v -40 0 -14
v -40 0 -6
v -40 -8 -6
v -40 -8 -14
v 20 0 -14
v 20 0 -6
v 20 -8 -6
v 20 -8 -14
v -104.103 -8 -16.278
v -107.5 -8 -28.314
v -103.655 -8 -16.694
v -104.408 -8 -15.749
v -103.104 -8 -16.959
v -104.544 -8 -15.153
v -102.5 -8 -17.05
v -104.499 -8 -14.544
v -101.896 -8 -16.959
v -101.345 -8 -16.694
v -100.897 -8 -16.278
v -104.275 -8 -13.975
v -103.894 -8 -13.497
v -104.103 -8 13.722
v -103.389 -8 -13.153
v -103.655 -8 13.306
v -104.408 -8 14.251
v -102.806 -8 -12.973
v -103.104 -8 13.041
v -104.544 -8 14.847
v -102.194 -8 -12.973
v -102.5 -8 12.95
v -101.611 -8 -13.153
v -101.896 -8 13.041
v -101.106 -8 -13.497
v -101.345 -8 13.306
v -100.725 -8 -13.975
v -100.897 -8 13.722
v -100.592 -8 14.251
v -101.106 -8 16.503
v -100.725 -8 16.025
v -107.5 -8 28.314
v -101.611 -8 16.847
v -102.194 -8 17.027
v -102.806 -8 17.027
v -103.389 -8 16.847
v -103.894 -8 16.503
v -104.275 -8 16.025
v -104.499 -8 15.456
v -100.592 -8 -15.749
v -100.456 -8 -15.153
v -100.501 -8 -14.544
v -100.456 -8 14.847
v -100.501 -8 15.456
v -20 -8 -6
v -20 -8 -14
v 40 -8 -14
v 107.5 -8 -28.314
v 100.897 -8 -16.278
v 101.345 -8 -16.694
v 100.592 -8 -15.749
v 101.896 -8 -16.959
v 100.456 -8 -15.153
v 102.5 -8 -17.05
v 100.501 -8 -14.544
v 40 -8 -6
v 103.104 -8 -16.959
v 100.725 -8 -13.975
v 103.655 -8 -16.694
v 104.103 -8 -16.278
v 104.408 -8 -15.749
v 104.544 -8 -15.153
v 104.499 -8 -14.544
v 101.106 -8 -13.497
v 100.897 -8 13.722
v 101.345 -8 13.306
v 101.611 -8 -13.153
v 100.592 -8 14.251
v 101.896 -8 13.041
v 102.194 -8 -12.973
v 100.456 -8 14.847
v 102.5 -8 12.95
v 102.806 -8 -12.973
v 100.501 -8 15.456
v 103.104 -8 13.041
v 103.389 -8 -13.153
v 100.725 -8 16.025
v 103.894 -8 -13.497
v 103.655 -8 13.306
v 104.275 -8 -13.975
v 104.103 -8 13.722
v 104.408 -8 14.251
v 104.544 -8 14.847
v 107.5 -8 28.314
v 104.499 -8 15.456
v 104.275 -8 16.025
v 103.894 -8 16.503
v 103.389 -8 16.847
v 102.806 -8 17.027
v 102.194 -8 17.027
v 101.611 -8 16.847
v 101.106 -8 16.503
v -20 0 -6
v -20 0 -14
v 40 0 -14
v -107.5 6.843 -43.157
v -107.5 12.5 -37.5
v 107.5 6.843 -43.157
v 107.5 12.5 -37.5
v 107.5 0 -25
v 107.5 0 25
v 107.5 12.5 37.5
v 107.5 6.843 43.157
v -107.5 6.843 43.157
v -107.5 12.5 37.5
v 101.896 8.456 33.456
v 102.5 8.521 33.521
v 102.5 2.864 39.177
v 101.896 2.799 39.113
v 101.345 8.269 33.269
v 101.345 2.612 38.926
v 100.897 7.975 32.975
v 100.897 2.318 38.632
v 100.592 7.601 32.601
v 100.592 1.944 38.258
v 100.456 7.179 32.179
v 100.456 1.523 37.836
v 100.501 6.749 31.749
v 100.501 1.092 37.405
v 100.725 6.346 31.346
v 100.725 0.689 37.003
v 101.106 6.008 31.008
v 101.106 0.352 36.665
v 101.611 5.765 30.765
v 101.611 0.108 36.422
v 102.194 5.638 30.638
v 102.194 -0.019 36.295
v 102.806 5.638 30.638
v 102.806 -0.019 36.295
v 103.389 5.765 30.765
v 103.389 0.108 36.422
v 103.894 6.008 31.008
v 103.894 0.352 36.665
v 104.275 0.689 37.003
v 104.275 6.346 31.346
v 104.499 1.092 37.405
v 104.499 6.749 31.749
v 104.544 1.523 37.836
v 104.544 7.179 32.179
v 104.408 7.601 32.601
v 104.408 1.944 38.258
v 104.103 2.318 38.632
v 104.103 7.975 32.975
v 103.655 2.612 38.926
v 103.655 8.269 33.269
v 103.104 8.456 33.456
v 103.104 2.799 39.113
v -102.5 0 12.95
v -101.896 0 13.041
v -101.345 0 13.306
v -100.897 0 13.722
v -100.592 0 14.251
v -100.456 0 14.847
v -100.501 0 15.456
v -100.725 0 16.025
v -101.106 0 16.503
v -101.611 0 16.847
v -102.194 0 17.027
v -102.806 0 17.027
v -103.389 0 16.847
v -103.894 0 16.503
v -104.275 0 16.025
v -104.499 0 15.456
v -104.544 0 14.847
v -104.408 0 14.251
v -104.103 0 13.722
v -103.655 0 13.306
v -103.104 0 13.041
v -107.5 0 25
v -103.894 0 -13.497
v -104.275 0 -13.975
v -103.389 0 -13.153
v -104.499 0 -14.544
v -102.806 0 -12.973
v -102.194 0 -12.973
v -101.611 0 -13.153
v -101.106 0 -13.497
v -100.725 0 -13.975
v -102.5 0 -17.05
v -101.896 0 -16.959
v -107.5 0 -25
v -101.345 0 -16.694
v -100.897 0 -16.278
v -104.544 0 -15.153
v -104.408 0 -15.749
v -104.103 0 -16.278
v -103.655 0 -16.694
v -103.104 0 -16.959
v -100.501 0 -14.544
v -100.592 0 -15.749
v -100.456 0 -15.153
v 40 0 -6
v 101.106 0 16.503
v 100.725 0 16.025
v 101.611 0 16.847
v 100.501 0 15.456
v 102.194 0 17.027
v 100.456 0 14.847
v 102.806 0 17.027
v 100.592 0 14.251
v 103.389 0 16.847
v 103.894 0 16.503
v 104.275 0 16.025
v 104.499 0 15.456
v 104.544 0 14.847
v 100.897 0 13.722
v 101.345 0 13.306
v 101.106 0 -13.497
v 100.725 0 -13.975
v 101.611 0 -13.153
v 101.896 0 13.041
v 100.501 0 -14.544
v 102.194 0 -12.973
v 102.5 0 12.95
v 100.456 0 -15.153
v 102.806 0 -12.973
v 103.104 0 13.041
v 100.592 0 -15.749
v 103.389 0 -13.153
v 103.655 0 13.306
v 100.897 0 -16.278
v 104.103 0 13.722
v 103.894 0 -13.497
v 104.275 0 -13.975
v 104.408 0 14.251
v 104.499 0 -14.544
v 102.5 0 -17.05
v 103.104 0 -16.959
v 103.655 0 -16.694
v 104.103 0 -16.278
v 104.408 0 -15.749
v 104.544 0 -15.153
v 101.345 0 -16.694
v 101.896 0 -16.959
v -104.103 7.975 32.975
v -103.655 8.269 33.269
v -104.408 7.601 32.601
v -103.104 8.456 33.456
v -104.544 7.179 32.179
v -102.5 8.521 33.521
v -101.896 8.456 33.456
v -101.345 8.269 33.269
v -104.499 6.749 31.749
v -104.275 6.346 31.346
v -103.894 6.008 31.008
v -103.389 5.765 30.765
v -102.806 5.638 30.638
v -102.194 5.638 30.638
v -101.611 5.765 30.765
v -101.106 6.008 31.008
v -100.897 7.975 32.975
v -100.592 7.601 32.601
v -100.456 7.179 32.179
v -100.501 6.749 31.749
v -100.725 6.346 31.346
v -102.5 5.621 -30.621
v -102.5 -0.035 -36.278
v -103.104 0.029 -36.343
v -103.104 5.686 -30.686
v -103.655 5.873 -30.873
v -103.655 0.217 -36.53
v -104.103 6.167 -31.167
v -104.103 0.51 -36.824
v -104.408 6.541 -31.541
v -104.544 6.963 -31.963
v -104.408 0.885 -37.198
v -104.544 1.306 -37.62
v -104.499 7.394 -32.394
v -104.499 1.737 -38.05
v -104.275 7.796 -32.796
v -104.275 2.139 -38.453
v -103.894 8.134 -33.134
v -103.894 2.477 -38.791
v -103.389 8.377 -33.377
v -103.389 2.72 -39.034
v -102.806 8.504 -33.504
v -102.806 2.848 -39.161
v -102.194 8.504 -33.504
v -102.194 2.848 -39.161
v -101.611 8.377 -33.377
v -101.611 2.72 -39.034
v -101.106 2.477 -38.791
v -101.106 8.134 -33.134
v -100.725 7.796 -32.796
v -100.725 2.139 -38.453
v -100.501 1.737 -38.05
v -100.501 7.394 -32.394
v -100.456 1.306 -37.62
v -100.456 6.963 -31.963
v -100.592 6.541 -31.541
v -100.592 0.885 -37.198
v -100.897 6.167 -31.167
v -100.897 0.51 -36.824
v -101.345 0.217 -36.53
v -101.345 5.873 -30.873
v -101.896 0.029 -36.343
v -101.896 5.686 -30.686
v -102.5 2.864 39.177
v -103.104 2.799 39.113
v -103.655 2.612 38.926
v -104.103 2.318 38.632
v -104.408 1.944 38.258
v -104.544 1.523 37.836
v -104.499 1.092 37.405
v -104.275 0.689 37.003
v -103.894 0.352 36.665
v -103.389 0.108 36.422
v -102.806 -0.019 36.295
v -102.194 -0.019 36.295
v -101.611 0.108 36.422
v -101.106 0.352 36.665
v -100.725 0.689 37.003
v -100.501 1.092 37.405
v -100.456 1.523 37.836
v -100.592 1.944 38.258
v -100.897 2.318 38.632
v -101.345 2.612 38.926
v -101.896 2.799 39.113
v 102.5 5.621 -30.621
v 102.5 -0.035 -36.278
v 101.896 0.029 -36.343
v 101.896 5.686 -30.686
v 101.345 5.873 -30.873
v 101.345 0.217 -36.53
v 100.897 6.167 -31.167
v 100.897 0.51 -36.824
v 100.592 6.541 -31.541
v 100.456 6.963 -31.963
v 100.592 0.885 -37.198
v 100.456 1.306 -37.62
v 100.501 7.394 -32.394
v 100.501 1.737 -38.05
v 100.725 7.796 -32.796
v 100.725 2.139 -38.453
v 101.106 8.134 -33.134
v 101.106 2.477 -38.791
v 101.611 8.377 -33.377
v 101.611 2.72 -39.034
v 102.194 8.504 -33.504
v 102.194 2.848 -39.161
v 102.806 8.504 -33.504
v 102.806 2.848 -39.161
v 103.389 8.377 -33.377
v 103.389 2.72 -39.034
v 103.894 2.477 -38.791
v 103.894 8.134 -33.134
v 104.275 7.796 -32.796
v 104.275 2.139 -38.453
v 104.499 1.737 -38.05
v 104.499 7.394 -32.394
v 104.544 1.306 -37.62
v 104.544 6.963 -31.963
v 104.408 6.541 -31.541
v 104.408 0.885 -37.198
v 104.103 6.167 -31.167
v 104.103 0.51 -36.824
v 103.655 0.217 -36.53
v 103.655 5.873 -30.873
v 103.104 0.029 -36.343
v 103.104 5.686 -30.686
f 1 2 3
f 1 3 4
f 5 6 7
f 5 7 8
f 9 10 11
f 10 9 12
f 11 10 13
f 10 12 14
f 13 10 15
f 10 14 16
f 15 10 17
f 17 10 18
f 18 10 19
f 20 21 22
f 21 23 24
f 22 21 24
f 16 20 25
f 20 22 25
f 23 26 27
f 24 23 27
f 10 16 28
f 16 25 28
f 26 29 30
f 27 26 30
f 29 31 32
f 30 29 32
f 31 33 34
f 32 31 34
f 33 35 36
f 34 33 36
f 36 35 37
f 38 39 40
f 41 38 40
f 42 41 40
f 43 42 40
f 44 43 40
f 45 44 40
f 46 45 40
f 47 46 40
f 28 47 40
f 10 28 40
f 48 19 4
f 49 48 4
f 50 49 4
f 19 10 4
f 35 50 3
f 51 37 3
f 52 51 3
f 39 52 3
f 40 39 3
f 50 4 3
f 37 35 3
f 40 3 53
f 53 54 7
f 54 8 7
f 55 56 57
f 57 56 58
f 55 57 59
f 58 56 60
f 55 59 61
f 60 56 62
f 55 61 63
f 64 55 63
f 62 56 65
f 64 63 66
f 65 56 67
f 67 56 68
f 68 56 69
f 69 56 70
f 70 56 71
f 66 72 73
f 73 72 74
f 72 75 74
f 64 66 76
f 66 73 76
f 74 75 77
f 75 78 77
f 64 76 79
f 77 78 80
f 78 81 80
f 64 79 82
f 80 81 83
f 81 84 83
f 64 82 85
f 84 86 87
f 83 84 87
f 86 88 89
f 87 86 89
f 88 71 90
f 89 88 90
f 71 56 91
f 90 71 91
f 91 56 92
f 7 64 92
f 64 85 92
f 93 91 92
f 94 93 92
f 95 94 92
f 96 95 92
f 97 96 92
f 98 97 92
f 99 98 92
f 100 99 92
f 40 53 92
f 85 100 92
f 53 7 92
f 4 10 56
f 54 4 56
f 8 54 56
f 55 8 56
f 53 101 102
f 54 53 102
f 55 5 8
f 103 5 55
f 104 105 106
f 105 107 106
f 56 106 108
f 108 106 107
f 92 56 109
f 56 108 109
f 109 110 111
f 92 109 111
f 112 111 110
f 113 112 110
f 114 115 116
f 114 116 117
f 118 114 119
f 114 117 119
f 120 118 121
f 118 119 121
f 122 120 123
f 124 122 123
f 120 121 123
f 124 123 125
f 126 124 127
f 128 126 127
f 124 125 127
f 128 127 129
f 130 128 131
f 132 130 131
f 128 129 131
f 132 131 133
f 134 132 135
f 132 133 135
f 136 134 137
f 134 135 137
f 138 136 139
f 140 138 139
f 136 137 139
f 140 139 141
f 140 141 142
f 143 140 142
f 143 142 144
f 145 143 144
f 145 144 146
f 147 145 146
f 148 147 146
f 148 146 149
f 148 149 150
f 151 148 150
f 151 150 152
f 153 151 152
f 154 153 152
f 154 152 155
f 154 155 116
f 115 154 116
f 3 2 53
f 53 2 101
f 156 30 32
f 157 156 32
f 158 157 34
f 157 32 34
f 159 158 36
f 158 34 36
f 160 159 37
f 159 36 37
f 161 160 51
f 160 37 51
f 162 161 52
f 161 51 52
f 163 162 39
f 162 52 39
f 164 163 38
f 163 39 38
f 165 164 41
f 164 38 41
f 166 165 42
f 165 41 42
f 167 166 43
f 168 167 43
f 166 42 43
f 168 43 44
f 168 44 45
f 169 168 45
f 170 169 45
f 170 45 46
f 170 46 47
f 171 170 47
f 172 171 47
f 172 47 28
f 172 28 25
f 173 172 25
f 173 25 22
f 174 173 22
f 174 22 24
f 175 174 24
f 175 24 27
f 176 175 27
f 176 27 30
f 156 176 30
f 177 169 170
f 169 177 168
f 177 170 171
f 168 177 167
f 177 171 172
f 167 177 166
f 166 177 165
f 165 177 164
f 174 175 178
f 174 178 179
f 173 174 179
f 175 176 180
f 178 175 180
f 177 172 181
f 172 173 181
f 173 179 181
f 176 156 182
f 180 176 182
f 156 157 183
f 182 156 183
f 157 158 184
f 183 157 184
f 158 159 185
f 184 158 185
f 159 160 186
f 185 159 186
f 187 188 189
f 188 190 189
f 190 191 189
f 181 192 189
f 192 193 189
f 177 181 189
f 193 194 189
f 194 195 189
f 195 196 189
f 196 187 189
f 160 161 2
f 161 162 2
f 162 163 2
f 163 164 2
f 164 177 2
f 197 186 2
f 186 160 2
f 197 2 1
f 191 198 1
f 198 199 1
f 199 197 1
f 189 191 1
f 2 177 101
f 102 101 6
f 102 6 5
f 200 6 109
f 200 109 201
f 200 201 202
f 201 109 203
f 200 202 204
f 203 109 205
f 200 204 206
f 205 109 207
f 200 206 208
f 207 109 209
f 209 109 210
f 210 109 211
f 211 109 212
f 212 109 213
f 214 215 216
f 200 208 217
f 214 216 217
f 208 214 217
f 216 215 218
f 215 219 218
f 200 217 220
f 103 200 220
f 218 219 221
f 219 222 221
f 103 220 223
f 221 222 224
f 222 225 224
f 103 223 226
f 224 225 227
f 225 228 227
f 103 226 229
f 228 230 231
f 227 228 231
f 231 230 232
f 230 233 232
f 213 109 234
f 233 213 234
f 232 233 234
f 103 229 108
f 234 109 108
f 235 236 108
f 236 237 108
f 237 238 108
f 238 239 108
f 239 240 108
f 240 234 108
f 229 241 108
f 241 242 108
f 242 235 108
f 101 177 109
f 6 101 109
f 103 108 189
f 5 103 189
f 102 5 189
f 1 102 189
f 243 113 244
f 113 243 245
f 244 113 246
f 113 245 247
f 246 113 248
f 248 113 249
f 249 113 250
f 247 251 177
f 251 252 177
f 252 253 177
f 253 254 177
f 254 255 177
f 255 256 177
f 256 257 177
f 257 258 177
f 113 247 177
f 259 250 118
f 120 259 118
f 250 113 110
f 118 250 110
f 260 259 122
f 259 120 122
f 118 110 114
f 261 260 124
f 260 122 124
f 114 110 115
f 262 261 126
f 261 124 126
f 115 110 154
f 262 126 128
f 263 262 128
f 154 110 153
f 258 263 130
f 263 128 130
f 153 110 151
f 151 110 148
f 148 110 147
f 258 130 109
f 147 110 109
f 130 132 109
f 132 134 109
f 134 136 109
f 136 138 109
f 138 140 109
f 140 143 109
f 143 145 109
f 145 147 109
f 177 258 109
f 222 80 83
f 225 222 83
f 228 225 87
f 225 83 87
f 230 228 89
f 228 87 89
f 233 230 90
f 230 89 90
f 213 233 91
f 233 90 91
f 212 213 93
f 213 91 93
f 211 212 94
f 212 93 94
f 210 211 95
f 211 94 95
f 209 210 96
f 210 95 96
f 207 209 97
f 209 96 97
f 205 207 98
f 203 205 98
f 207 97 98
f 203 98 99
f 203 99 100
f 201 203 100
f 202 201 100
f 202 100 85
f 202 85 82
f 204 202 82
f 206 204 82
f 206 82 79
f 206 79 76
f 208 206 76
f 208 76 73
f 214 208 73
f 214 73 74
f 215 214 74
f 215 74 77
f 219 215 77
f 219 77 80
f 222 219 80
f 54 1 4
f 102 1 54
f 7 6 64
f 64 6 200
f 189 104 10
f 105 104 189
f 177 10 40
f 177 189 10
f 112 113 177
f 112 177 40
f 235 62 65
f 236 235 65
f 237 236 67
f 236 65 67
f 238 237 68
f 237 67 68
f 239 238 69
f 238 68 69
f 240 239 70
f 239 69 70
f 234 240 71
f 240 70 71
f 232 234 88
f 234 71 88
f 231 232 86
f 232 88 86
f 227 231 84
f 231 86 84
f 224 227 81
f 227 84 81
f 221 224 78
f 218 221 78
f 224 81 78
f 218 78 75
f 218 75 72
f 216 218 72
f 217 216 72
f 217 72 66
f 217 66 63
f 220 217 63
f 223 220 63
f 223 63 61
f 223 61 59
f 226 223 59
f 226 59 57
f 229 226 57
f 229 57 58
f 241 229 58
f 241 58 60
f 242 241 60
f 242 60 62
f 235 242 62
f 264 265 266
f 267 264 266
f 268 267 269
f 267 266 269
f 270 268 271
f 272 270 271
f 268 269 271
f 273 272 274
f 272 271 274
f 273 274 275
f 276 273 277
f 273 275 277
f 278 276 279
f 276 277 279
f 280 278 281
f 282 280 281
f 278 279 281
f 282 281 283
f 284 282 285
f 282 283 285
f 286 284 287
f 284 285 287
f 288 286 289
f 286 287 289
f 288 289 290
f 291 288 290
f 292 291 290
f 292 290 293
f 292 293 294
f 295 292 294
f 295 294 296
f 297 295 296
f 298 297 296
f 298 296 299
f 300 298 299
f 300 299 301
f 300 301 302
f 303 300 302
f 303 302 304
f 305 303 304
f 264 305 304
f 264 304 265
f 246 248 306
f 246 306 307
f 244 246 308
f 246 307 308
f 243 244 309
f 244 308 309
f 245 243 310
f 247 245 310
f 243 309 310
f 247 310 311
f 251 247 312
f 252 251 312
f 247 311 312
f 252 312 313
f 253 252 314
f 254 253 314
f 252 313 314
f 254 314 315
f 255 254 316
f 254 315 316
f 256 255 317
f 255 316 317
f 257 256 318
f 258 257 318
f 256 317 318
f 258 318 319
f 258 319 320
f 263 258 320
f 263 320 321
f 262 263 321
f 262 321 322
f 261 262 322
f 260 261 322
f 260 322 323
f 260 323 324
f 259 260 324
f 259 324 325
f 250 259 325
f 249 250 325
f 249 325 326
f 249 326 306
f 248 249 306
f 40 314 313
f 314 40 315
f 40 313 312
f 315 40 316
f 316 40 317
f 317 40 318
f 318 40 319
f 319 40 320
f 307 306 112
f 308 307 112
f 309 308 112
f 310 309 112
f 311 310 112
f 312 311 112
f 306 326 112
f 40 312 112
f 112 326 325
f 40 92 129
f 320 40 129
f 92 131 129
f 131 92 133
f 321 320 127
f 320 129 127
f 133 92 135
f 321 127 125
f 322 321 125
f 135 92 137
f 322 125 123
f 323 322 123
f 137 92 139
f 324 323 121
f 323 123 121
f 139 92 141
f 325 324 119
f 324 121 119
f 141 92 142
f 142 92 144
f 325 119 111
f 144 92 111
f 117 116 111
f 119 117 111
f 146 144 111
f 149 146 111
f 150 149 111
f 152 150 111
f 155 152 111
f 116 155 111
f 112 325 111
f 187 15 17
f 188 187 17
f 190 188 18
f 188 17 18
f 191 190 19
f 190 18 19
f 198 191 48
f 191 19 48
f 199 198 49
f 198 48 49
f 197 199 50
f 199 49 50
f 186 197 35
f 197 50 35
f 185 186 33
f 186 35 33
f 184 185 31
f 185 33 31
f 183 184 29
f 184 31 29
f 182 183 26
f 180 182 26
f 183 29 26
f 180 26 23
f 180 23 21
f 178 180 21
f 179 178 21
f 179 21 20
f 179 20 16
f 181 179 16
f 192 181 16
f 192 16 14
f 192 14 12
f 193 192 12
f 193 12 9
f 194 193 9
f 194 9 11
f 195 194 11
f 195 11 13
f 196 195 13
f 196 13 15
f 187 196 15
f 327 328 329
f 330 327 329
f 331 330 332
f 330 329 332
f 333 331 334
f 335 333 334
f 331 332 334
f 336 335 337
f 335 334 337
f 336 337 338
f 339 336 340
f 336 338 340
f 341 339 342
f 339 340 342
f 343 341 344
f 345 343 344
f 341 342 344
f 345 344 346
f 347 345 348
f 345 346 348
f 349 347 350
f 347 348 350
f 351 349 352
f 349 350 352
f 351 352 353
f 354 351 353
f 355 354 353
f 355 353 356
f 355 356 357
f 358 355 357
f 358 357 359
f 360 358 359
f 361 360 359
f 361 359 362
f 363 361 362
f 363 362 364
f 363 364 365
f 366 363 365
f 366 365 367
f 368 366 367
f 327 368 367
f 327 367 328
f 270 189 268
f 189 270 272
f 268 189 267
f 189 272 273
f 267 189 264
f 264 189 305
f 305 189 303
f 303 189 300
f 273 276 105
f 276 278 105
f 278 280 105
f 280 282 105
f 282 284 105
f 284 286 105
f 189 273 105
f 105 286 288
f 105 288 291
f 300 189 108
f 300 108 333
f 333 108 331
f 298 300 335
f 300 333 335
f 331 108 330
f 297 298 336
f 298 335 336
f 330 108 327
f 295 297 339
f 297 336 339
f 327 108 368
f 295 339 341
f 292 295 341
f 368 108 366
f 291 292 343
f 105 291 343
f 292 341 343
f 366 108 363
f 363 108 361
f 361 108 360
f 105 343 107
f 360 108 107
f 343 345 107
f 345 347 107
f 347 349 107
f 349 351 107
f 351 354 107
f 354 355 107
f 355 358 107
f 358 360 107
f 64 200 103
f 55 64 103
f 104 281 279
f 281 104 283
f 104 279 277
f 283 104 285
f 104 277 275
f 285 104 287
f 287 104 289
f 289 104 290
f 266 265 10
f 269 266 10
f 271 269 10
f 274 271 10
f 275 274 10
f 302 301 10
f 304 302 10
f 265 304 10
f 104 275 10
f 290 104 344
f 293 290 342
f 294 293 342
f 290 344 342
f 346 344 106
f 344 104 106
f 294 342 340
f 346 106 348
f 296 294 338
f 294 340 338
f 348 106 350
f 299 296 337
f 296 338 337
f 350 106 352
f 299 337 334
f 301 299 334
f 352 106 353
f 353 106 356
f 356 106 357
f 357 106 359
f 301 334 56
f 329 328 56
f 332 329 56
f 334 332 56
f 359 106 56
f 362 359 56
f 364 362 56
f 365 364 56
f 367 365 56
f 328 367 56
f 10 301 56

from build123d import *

# Parameters (mm, degrees)
MAIN_DEPTH                      = 107.5
F_4_0MM_DOWEL_HOLE2_D           = 4.1
F_4_0MM_DOWEL_HOLE2_ON_FACE_2_D = 4.1
F_4_0MM_DOWEL_HOLE2_ON_FACE_3_D = 4.1
F_4_0MM_DOWEL_HOLE2_ON_FACE_4_D = 4.1
SKETCH6_W                       = 20
SKETCH6_H                       = 8
SHELF_CUT_DEPTH                 = 117.511862352


with BuildPart() as part:
    # Sketch2 → Main (new, symmetric)
    with BuildSketch(Plane(origin=(0, 0, 0), x_dir=(0, 0, -1), z_dir=(1, 0, 0))):
        Polygon((-25, 0), (25, 0), (37.5, 12.5), (43.156854249, 6.843145751), (28.313708499, -8), (-28.313708499, -8), (-43.156854249, 6.843145751), (-37.5, 12.5), align=None)
    extrude(amount=MAIN_DEPTH, both=True)

    # Ø4.0mm Dowel Hole2 (through all)
    with Locations(Plane(origin=(-102.5, 7.071067812, -32.071067812), x_dir=(0, 0.707106781187, -0.707106781187), z_dir=(0, 0.707106781187, 0.707106781187))):
        with Locations((0, 0)):
            Hole(F_4_0MM_DOWEL_HOLE2_D / 2)

    # Ø4.0mm Dowel Hole2 on face 2 (through all)
    with Locations(Plane(origin=(-102.5, 0, -15), x_dir=(0, 0, 1), z_dir=(0, 1, 0))):
        with Locations((0, 0), (30, 0), (30, 205), (0, 205)):
            Hole(F_4_0MM_DOWEL_HOLE2_ON_FACE_2_D / 2)

    # Ø4.0mm Dowel Hole2 on face 3 (through all)
    with Locations(Plane(origin=(-102.5, 7.071067812, 32.071067812), x_dir=(0, -0.707106781187, -0.707106781187), z_dir=(0, 0.707106781187, -0.707106781187))):
        with Locations((0, 0), (0, -205)):
            Hole(F_4_0MM_DOWEL_HOLE2_ON_FACE_3_D / 2)

    # Ø4.0mm Dowel Hole2 on face 4 (through all)
    with Locations(Plane(origin=(102.5, 7.071067812, -32.071067812), x_dir=(0, 0.707106781187, -0.707106781187), z_dir=(0, 0.707106781187, 0.707106781187))):
        with Locations((0, 0)):
            Hole(F_4_0MM_DOWEL_HOLE2_ON_FACE_4_D / 2)

    # Sketch6 → Shelf cut (cut, through all)
    with BuildSketch(Plane(origin=(0, 0, 0), x_dir=(1, 0, 0), z_dir=(0, 1, 0))):
        with Locations((30, 10)):
            Rectangle(SKETCH6_W, SKETCH6_H)
        with Locations((-30, 10)):
            Rectangle(SKETCH6_W, SKETCH6_H)
    extrude(amount=-SHELF_CUT_DEPTH, mode=Mode.SUBTRACT)


solid = part.part
